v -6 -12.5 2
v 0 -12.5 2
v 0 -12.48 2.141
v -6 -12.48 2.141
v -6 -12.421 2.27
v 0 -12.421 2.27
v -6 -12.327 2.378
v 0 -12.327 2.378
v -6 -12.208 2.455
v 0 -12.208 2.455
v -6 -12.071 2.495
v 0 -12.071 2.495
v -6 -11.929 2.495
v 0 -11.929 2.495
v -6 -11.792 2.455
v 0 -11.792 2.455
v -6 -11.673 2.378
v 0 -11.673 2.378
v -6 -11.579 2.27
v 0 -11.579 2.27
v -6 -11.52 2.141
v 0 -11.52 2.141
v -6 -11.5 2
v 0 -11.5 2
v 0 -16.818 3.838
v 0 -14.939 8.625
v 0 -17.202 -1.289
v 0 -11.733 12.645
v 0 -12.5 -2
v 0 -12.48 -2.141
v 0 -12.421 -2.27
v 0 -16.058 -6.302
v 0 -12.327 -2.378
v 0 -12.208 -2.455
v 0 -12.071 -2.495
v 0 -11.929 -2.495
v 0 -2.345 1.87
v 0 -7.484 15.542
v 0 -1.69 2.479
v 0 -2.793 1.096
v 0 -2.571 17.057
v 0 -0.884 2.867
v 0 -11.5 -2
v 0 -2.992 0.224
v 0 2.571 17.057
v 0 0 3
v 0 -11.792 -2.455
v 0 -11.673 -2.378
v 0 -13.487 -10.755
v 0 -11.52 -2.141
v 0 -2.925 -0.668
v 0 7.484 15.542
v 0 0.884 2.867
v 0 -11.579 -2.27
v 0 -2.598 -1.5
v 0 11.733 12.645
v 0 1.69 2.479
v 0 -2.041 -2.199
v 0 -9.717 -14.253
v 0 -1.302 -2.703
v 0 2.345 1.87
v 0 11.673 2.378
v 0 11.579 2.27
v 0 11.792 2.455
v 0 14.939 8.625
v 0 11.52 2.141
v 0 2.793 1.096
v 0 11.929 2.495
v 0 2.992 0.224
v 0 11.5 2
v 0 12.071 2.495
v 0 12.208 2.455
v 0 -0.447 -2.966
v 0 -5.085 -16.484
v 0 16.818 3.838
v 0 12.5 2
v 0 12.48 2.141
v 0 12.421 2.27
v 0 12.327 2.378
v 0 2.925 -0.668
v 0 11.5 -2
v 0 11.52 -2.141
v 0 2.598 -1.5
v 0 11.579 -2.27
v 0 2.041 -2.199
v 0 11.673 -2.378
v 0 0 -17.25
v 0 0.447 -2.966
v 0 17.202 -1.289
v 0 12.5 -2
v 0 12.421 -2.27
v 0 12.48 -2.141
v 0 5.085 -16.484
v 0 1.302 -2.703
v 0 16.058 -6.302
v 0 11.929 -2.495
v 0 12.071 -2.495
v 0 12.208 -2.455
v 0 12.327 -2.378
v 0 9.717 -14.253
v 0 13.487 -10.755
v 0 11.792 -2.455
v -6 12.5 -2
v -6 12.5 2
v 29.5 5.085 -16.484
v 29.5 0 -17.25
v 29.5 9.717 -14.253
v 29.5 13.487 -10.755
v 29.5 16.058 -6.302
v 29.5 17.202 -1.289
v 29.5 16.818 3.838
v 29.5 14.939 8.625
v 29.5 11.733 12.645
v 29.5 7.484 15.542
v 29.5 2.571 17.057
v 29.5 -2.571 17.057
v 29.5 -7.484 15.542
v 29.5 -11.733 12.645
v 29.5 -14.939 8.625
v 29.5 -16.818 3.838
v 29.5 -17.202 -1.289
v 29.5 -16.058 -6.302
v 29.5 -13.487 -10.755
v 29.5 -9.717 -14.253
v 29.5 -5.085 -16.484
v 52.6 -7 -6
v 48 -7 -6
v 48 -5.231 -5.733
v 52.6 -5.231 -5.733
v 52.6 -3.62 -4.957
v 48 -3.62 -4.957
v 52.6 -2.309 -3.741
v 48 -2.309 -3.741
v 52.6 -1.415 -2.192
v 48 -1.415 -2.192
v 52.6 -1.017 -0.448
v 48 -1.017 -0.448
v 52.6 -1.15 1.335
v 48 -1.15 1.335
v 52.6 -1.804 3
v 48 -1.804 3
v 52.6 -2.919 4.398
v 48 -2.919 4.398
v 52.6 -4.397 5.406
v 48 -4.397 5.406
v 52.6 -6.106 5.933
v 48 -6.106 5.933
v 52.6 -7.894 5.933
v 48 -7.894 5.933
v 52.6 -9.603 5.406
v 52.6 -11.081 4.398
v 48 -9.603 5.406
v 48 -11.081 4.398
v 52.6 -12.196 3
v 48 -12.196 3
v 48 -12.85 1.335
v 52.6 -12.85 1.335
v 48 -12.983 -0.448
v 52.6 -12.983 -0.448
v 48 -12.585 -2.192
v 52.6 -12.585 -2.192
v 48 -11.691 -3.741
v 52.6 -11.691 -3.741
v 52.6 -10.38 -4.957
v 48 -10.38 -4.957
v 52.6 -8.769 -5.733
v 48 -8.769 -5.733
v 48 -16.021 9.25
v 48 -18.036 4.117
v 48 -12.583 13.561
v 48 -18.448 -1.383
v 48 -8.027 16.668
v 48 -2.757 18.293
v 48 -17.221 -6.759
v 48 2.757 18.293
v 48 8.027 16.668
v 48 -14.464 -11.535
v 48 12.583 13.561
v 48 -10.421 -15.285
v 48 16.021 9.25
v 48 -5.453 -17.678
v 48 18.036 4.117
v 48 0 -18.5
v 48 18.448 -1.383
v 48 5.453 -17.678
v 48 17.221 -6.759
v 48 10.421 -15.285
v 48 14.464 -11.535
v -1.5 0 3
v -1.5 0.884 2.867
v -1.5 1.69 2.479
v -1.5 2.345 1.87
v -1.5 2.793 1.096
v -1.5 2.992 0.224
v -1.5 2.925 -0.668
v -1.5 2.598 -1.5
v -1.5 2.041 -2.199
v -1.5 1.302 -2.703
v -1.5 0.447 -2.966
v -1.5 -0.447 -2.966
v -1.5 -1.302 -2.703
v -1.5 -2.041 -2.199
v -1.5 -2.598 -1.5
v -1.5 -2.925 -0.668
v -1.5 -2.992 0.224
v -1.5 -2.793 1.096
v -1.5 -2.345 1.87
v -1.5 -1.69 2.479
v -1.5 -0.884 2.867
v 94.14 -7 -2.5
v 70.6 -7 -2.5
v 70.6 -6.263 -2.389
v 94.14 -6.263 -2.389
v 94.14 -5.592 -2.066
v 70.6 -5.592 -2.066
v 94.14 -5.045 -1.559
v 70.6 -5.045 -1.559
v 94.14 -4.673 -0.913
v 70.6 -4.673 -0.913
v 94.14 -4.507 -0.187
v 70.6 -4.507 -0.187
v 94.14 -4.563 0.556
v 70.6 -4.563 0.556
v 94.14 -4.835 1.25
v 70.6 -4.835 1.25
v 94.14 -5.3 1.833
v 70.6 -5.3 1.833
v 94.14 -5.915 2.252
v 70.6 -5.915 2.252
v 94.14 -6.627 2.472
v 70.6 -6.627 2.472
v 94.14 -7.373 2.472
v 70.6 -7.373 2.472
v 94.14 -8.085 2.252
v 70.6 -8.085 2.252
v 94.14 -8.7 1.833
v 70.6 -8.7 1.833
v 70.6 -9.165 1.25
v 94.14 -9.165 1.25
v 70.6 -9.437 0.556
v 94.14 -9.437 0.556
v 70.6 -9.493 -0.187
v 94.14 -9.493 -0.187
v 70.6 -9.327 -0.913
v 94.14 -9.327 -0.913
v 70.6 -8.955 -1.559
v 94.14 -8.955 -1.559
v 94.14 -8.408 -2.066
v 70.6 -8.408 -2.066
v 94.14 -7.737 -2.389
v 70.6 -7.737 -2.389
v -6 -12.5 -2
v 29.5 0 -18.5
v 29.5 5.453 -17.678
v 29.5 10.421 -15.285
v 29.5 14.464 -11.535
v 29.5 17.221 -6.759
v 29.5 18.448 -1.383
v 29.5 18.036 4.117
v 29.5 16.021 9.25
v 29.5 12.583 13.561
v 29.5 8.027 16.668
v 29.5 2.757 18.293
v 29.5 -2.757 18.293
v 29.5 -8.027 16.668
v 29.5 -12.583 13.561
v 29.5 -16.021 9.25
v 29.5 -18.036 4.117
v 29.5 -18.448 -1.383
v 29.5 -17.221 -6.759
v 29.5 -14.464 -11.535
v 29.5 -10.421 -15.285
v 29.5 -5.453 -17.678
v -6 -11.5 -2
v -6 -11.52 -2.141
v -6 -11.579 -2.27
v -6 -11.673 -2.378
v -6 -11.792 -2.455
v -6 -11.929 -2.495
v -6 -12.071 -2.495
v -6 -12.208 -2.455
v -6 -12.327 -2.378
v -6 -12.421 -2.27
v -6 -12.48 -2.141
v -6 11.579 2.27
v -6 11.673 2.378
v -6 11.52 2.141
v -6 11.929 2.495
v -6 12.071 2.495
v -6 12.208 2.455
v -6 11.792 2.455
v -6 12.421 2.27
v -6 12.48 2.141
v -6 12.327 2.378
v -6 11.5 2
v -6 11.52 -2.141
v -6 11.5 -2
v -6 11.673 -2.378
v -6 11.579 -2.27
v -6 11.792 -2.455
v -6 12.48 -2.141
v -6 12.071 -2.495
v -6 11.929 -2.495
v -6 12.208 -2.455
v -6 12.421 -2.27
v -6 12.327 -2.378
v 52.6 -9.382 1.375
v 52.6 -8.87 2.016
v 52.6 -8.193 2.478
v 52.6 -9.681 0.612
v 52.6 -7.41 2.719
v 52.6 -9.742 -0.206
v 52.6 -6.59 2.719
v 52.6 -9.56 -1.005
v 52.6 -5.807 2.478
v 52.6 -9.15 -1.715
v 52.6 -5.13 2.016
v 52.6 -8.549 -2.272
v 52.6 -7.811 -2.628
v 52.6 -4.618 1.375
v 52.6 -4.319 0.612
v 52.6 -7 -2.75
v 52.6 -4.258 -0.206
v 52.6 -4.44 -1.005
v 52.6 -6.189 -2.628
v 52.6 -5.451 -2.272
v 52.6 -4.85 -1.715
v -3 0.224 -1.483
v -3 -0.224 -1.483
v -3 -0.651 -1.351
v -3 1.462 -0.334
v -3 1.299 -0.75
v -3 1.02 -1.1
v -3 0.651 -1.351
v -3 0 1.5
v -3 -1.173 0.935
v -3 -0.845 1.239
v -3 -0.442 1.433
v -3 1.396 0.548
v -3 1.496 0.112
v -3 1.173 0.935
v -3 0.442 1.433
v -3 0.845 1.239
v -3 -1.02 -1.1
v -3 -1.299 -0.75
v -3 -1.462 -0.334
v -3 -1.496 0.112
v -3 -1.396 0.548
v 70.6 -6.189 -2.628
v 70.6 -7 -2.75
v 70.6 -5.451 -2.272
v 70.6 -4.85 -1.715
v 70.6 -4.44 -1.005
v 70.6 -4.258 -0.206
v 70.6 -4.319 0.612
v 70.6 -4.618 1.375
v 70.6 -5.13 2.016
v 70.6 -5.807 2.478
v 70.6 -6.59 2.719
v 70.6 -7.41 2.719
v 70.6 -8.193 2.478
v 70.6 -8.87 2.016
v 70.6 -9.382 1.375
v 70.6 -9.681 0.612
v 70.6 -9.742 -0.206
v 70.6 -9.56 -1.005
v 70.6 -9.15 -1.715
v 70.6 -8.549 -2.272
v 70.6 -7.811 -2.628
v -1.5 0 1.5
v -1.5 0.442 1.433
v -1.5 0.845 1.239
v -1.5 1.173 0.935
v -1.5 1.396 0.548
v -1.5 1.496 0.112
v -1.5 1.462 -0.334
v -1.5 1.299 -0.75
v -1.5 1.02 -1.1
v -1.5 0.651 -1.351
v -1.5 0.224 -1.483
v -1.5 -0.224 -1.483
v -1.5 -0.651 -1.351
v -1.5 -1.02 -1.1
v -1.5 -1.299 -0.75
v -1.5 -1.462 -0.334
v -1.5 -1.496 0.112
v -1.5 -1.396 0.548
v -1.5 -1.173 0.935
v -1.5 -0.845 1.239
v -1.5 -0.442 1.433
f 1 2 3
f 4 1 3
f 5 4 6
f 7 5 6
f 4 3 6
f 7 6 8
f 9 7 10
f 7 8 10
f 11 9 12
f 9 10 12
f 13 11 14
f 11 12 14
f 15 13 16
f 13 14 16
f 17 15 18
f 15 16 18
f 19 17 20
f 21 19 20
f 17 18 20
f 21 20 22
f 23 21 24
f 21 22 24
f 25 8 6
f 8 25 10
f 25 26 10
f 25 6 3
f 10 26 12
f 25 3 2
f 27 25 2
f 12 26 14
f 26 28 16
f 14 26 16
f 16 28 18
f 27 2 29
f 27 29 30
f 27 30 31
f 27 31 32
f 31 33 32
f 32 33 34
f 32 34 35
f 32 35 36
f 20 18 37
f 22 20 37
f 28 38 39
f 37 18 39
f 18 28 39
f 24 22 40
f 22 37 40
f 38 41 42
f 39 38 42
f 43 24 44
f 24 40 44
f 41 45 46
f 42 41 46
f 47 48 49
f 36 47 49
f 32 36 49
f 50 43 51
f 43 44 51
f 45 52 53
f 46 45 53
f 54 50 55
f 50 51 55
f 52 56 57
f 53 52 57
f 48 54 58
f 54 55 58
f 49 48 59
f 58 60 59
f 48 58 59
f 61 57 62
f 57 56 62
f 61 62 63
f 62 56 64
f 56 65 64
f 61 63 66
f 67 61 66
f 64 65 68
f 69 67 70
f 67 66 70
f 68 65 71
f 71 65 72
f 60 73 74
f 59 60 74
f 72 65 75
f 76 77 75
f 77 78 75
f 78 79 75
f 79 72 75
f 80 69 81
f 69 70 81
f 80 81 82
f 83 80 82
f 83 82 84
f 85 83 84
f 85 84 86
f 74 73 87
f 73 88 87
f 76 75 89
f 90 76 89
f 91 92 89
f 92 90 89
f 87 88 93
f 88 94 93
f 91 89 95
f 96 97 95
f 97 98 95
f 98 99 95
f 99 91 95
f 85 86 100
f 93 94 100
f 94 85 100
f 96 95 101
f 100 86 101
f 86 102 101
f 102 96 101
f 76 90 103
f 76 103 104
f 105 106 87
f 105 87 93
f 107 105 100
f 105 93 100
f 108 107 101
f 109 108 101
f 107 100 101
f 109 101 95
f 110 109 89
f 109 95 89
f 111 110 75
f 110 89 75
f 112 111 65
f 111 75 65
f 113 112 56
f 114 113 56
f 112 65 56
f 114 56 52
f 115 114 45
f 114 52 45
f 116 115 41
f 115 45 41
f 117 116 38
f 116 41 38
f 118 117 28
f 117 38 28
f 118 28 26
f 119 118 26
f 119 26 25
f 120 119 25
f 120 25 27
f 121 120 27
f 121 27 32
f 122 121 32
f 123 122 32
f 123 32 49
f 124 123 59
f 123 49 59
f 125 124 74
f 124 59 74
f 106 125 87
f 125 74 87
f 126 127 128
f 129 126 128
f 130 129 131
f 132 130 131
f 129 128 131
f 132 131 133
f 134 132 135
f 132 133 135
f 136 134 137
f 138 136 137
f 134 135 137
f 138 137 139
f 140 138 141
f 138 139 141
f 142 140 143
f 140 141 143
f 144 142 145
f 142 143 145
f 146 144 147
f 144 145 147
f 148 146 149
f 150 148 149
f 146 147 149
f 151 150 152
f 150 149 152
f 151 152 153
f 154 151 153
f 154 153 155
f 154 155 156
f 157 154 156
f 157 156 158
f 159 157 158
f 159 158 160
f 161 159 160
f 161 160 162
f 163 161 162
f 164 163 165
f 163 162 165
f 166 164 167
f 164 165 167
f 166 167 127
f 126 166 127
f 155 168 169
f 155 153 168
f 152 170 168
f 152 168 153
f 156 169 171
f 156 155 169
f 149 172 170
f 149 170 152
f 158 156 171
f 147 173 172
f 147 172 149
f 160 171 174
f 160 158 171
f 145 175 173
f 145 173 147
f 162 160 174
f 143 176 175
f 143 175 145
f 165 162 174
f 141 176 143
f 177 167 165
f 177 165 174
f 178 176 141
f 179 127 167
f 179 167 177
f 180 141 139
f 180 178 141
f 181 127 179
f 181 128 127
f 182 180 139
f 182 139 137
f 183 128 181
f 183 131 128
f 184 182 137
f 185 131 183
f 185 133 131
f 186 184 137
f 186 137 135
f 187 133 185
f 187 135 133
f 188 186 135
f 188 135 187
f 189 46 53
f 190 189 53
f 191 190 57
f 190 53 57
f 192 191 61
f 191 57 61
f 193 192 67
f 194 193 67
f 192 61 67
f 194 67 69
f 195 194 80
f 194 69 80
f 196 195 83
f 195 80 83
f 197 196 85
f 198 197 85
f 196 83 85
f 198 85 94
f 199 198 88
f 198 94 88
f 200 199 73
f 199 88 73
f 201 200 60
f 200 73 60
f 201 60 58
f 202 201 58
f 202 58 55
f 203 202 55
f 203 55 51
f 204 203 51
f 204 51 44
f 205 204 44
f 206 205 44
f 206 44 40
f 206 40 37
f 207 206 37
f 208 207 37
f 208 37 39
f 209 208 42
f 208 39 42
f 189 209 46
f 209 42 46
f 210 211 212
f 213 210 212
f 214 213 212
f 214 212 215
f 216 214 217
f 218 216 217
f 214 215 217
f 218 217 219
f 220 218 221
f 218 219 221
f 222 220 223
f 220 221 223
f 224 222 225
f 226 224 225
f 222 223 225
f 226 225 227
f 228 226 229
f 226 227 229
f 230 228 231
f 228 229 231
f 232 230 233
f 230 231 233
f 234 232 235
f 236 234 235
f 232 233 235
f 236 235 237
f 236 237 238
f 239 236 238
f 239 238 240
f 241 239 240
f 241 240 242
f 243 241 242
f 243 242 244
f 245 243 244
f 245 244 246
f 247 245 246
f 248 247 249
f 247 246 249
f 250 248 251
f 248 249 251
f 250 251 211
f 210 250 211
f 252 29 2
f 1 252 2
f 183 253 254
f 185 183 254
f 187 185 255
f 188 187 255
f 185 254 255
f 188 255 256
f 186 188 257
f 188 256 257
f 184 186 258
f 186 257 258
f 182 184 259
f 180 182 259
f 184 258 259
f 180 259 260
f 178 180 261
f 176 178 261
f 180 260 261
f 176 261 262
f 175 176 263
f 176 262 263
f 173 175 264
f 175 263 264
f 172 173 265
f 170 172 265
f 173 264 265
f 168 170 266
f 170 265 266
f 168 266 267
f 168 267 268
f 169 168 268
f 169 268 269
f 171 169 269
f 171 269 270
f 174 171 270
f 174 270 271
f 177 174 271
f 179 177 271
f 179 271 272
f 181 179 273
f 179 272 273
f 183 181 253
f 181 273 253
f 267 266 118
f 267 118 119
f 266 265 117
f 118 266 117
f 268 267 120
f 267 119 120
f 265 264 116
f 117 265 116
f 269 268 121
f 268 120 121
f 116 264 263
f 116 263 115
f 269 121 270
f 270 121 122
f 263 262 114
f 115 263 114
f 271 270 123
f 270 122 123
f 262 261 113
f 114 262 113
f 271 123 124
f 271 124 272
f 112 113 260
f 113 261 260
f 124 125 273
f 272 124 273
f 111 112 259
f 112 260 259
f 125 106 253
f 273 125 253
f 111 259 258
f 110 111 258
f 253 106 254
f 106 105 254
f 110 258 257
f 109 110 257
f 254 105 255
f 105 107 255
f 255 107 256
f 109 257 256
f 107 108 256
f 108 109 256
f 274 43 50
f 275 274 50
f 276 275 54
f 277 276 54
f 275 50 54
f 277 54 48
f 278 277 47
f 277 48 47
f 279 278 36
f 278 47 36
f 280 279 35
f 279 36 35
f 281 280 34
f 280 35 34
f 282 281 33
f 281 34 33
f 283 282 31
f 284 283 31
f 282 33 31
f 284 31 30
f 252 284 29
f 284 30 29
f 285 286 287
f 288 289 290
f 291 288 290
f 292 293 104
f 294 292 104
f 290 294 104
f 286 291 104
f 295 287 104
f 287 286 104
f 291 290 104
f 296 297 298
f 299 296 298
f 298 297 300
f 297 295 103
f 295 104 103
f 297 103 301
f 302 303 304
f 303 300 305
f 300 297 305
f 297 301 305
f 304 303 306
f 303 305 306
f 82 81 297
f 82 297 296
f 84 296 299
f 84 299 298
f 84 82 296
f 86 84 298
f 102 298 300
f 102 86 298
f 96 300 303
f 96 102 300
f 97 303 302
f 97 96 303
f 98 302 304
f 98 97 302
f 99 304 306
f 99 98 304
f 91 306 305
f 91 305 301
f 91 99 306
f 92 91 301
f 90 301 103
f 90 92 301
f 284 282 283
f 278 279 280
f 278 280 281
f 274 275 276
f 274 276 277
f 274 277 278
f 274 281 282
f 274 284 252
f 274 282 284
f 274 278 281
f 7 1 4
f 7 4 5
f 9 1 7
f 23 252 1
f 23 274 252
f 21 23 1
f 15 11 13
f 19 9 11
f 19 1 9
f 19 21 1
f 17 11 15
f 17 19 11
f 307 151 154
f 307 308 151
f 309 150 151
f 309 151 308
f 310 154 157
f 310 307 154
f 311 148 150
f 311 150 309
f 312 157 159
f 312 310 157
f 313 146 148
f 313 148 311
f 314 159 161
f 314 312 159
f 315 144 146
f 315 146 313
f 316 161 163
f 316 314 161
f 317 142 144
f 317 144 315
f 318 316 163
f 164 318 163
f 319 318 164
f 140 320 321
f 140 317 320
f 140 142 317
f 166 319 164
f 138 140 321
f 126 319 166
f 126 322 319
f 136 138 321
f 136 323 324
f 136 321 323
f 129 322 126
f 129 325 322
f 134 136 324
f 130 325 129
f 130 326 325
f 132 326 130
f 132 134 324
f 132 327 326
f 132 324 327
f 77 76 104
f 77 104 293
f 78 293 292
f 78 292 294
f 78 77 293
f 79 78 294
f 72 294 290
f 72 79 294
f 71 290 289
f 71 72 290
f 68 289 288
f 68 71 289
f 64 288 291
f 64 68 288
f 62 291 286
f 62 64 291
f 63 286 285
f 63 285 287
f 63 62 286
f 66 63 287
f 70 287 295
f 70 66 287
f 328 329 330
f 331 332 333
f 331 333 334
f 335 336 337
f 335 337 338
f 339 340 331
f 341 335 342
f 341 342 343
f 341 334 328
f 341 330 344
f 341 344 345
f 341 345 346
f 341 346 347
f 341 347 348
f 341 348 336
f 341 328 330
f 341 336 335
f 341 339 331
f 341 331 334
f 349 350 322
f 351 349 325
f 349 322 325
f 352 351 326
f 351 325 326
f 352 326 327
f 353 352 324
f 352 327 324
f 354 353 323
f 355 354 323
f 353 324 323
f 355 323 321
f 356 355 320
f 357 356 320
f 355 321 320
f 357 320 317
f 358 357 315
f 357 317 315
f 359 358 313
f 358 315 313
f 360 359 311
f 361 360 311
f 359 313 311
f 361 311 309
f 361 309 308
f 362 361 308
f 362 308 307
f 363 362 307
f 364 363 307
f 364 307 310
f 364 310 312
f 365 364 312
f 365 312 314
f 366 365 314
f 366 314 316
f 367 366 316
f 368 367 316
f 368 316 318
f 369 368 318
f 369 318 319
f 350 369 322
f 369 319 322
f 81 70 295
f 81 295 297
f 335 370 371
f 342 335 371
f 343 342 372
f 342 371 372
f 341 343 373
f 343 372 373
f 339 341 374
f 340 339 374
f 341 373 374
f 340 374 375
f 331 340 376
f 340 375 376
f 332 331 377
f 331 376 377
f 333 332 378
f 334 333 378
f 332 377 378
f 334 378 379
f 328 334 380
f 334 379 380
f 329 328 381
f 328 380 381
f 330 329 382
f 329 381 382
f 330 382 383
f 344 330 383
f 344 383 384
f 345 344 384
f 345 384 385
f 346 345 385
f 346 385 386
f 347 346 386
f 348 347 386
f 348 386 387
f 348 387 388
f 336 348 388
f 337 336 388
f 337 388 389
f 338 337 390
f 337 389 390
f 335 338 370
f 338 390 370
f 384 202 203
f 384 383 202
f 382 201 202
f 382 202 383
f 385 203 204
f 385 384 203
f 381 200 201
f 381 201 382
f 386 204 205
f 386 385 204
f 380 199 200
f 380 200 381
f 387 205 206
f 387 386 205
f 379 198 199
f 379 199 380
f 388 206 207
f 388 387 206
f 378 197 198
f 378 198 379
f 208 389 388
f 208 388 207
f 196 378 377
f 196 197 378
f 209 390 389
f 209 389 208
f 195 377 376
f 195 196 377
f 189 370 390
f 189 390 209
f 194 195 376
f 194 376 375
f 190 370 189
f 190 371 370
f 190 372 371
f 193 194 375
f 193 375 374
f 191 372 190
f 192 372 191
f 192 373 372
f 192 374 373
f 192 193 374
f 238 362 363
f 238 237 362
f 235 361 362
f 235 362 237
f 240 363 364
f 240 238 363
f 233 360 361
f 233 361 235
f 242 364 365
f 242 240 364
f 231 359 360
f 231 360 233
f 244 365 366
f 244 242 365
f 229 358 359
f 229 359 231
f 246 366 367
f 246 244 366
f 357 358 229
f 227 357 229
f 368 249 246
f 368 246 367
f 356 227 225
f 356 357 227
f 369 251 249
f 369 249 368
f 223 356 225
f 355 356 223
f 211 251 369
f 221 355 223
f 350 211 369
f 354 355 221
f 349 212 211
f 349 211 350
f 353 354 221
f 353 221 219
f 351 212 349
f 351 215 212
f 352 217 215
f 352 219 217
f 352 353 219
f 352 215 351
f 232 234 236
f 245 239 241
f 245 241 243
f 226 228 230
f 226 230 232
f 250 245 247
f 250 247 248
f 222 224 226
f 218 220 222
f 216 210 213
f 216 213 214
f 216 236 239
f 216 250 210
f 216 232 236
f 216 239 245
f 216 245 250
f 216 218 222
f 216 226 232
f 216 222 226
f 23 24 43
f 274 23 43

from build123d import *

# Parameters (mm, degrees)
SKETCH1_R           = 17.25
BOSS_EXTRUDE1_DEPTH = 29.5
SKETCH2_R           = 18.5
BOSS_EXTRUDE2_DEPTH = 18.5
SKETCH3_R           = 3
BOSS_EXTRUDE3_DEPTH = 1.5
SKETCH4_R           = 1.5
BOSS_EXTRUDE4_DEPTH = 1.5
BOSS_EXTRUDE5_DEPTH = 6
SKETCH7_R           = 6
BOSS_EXTRUDE6_DEPTH = 4.6
SKETCH8_R           = 2.75
BOSS_EXTRUDE7_DEPTH = 18
SKETCH9_R           = 2.5
BOSS_EXTRUDE8_DEPTH = 23.54


with BuildPart() as part:
    # Sketch1 → Boss-Extrude1 (new body)
    with BuildSketch(Plane(origin=(0, 0, 0), x_dir=(0, 0, -1), z_dir=(1, 0, 0))):
        Circle(SKETCH1_R)
    extrude(amount=BOSS_EXTRUDE1_DEPTH)

    # Sketch2 → Boss-Extrude2 (add)
    with BuildSketch(Plane(origin=(29.5, 0, 0), x_dir=(0, 0, -1), z_dir=(1, 0, 0))):
        Circle(SKETCH2_R)
    extrude(amount=BOSS_EXTRUDE2_DEPTH)

    # Sketch3 → Boss-Extrude3 (add)
    with BuildSketch(Plane.ZY):
        Circle(SKETCH3_R)
    extrude(amount=BOSS_EXTRUDE3_DEPTH)

    # Sketch4 → Boss-Extrude4 (add)
    with BuildSketch(Plane.ZY.offset(1.5)):
        Circle(SKETCH4_R)
    extrude(amount=BOSS_EXTRUDE4_DEPTH)

    # Sketch5 → Boss-Extrude5 (add)
    with BuildSketch(Plane.ZY):
        with BuildLine():
            Line((-2, 12.5), (2, 12.5))
            ThreePointArc((2, 12.5), (2.5, 12), (2, 11.5))
            Line((2, 11.5), (-2, 11.5))
            ThreePointArc((-2, 11.5), (-2.5, 12), (-2, 12.5))
        make_face()
        with BuildLine():
            Line((-2, -12.5), (2, -12.5))
            ThreePointArc((2, -12.5), (2.5, -12), (2, -11.5))
            Line((2, -11.5), (-2, -11.5))
            ThreePointArc((-2, -11.5), (-2.5, -12), (-2, -12.5))
        make_face()
    extrude(amount=BOSS_EXTRUDE5_DEPTH)

    # Sketch7 → Boss-Extrude6 (add)
    with BuildSketch(Plane(origin=(48, 0, 0), x_dir=(0, 0, -1), z_dir=(1, 0, 0))):
        with Locations((0, -7)):
            Circle(SKETCH7_R)
    extrude(amount=BOSS_EXTRUDE6_DEPTH)

    # Sketch8 → Boss-Extrude7 (add)
    with BuildSketch(Plane(origin=(52.6, 0, 0), x_dir=(0, 0, -1), z_dir=(1, 0, 0))):
        with Locations((0, -7)):
            Circle(SKETCH8_R)
    extrude(amount=BOSS_EXTRUDE7_DEPTH)

    # Sketch9 → Boss-Extrude8 (add)
    with BuildSketch(Plane(origin=(70.6, 0, 0), x_dir=(0, 0, -1), z_dir=(1, 0, 0))):
        with Locations((0, -7)):
            Circle(SKETCH9_R)
    extrude(amount=BOSS_EXTRUDE8_DEPTH)


solid = part.part
